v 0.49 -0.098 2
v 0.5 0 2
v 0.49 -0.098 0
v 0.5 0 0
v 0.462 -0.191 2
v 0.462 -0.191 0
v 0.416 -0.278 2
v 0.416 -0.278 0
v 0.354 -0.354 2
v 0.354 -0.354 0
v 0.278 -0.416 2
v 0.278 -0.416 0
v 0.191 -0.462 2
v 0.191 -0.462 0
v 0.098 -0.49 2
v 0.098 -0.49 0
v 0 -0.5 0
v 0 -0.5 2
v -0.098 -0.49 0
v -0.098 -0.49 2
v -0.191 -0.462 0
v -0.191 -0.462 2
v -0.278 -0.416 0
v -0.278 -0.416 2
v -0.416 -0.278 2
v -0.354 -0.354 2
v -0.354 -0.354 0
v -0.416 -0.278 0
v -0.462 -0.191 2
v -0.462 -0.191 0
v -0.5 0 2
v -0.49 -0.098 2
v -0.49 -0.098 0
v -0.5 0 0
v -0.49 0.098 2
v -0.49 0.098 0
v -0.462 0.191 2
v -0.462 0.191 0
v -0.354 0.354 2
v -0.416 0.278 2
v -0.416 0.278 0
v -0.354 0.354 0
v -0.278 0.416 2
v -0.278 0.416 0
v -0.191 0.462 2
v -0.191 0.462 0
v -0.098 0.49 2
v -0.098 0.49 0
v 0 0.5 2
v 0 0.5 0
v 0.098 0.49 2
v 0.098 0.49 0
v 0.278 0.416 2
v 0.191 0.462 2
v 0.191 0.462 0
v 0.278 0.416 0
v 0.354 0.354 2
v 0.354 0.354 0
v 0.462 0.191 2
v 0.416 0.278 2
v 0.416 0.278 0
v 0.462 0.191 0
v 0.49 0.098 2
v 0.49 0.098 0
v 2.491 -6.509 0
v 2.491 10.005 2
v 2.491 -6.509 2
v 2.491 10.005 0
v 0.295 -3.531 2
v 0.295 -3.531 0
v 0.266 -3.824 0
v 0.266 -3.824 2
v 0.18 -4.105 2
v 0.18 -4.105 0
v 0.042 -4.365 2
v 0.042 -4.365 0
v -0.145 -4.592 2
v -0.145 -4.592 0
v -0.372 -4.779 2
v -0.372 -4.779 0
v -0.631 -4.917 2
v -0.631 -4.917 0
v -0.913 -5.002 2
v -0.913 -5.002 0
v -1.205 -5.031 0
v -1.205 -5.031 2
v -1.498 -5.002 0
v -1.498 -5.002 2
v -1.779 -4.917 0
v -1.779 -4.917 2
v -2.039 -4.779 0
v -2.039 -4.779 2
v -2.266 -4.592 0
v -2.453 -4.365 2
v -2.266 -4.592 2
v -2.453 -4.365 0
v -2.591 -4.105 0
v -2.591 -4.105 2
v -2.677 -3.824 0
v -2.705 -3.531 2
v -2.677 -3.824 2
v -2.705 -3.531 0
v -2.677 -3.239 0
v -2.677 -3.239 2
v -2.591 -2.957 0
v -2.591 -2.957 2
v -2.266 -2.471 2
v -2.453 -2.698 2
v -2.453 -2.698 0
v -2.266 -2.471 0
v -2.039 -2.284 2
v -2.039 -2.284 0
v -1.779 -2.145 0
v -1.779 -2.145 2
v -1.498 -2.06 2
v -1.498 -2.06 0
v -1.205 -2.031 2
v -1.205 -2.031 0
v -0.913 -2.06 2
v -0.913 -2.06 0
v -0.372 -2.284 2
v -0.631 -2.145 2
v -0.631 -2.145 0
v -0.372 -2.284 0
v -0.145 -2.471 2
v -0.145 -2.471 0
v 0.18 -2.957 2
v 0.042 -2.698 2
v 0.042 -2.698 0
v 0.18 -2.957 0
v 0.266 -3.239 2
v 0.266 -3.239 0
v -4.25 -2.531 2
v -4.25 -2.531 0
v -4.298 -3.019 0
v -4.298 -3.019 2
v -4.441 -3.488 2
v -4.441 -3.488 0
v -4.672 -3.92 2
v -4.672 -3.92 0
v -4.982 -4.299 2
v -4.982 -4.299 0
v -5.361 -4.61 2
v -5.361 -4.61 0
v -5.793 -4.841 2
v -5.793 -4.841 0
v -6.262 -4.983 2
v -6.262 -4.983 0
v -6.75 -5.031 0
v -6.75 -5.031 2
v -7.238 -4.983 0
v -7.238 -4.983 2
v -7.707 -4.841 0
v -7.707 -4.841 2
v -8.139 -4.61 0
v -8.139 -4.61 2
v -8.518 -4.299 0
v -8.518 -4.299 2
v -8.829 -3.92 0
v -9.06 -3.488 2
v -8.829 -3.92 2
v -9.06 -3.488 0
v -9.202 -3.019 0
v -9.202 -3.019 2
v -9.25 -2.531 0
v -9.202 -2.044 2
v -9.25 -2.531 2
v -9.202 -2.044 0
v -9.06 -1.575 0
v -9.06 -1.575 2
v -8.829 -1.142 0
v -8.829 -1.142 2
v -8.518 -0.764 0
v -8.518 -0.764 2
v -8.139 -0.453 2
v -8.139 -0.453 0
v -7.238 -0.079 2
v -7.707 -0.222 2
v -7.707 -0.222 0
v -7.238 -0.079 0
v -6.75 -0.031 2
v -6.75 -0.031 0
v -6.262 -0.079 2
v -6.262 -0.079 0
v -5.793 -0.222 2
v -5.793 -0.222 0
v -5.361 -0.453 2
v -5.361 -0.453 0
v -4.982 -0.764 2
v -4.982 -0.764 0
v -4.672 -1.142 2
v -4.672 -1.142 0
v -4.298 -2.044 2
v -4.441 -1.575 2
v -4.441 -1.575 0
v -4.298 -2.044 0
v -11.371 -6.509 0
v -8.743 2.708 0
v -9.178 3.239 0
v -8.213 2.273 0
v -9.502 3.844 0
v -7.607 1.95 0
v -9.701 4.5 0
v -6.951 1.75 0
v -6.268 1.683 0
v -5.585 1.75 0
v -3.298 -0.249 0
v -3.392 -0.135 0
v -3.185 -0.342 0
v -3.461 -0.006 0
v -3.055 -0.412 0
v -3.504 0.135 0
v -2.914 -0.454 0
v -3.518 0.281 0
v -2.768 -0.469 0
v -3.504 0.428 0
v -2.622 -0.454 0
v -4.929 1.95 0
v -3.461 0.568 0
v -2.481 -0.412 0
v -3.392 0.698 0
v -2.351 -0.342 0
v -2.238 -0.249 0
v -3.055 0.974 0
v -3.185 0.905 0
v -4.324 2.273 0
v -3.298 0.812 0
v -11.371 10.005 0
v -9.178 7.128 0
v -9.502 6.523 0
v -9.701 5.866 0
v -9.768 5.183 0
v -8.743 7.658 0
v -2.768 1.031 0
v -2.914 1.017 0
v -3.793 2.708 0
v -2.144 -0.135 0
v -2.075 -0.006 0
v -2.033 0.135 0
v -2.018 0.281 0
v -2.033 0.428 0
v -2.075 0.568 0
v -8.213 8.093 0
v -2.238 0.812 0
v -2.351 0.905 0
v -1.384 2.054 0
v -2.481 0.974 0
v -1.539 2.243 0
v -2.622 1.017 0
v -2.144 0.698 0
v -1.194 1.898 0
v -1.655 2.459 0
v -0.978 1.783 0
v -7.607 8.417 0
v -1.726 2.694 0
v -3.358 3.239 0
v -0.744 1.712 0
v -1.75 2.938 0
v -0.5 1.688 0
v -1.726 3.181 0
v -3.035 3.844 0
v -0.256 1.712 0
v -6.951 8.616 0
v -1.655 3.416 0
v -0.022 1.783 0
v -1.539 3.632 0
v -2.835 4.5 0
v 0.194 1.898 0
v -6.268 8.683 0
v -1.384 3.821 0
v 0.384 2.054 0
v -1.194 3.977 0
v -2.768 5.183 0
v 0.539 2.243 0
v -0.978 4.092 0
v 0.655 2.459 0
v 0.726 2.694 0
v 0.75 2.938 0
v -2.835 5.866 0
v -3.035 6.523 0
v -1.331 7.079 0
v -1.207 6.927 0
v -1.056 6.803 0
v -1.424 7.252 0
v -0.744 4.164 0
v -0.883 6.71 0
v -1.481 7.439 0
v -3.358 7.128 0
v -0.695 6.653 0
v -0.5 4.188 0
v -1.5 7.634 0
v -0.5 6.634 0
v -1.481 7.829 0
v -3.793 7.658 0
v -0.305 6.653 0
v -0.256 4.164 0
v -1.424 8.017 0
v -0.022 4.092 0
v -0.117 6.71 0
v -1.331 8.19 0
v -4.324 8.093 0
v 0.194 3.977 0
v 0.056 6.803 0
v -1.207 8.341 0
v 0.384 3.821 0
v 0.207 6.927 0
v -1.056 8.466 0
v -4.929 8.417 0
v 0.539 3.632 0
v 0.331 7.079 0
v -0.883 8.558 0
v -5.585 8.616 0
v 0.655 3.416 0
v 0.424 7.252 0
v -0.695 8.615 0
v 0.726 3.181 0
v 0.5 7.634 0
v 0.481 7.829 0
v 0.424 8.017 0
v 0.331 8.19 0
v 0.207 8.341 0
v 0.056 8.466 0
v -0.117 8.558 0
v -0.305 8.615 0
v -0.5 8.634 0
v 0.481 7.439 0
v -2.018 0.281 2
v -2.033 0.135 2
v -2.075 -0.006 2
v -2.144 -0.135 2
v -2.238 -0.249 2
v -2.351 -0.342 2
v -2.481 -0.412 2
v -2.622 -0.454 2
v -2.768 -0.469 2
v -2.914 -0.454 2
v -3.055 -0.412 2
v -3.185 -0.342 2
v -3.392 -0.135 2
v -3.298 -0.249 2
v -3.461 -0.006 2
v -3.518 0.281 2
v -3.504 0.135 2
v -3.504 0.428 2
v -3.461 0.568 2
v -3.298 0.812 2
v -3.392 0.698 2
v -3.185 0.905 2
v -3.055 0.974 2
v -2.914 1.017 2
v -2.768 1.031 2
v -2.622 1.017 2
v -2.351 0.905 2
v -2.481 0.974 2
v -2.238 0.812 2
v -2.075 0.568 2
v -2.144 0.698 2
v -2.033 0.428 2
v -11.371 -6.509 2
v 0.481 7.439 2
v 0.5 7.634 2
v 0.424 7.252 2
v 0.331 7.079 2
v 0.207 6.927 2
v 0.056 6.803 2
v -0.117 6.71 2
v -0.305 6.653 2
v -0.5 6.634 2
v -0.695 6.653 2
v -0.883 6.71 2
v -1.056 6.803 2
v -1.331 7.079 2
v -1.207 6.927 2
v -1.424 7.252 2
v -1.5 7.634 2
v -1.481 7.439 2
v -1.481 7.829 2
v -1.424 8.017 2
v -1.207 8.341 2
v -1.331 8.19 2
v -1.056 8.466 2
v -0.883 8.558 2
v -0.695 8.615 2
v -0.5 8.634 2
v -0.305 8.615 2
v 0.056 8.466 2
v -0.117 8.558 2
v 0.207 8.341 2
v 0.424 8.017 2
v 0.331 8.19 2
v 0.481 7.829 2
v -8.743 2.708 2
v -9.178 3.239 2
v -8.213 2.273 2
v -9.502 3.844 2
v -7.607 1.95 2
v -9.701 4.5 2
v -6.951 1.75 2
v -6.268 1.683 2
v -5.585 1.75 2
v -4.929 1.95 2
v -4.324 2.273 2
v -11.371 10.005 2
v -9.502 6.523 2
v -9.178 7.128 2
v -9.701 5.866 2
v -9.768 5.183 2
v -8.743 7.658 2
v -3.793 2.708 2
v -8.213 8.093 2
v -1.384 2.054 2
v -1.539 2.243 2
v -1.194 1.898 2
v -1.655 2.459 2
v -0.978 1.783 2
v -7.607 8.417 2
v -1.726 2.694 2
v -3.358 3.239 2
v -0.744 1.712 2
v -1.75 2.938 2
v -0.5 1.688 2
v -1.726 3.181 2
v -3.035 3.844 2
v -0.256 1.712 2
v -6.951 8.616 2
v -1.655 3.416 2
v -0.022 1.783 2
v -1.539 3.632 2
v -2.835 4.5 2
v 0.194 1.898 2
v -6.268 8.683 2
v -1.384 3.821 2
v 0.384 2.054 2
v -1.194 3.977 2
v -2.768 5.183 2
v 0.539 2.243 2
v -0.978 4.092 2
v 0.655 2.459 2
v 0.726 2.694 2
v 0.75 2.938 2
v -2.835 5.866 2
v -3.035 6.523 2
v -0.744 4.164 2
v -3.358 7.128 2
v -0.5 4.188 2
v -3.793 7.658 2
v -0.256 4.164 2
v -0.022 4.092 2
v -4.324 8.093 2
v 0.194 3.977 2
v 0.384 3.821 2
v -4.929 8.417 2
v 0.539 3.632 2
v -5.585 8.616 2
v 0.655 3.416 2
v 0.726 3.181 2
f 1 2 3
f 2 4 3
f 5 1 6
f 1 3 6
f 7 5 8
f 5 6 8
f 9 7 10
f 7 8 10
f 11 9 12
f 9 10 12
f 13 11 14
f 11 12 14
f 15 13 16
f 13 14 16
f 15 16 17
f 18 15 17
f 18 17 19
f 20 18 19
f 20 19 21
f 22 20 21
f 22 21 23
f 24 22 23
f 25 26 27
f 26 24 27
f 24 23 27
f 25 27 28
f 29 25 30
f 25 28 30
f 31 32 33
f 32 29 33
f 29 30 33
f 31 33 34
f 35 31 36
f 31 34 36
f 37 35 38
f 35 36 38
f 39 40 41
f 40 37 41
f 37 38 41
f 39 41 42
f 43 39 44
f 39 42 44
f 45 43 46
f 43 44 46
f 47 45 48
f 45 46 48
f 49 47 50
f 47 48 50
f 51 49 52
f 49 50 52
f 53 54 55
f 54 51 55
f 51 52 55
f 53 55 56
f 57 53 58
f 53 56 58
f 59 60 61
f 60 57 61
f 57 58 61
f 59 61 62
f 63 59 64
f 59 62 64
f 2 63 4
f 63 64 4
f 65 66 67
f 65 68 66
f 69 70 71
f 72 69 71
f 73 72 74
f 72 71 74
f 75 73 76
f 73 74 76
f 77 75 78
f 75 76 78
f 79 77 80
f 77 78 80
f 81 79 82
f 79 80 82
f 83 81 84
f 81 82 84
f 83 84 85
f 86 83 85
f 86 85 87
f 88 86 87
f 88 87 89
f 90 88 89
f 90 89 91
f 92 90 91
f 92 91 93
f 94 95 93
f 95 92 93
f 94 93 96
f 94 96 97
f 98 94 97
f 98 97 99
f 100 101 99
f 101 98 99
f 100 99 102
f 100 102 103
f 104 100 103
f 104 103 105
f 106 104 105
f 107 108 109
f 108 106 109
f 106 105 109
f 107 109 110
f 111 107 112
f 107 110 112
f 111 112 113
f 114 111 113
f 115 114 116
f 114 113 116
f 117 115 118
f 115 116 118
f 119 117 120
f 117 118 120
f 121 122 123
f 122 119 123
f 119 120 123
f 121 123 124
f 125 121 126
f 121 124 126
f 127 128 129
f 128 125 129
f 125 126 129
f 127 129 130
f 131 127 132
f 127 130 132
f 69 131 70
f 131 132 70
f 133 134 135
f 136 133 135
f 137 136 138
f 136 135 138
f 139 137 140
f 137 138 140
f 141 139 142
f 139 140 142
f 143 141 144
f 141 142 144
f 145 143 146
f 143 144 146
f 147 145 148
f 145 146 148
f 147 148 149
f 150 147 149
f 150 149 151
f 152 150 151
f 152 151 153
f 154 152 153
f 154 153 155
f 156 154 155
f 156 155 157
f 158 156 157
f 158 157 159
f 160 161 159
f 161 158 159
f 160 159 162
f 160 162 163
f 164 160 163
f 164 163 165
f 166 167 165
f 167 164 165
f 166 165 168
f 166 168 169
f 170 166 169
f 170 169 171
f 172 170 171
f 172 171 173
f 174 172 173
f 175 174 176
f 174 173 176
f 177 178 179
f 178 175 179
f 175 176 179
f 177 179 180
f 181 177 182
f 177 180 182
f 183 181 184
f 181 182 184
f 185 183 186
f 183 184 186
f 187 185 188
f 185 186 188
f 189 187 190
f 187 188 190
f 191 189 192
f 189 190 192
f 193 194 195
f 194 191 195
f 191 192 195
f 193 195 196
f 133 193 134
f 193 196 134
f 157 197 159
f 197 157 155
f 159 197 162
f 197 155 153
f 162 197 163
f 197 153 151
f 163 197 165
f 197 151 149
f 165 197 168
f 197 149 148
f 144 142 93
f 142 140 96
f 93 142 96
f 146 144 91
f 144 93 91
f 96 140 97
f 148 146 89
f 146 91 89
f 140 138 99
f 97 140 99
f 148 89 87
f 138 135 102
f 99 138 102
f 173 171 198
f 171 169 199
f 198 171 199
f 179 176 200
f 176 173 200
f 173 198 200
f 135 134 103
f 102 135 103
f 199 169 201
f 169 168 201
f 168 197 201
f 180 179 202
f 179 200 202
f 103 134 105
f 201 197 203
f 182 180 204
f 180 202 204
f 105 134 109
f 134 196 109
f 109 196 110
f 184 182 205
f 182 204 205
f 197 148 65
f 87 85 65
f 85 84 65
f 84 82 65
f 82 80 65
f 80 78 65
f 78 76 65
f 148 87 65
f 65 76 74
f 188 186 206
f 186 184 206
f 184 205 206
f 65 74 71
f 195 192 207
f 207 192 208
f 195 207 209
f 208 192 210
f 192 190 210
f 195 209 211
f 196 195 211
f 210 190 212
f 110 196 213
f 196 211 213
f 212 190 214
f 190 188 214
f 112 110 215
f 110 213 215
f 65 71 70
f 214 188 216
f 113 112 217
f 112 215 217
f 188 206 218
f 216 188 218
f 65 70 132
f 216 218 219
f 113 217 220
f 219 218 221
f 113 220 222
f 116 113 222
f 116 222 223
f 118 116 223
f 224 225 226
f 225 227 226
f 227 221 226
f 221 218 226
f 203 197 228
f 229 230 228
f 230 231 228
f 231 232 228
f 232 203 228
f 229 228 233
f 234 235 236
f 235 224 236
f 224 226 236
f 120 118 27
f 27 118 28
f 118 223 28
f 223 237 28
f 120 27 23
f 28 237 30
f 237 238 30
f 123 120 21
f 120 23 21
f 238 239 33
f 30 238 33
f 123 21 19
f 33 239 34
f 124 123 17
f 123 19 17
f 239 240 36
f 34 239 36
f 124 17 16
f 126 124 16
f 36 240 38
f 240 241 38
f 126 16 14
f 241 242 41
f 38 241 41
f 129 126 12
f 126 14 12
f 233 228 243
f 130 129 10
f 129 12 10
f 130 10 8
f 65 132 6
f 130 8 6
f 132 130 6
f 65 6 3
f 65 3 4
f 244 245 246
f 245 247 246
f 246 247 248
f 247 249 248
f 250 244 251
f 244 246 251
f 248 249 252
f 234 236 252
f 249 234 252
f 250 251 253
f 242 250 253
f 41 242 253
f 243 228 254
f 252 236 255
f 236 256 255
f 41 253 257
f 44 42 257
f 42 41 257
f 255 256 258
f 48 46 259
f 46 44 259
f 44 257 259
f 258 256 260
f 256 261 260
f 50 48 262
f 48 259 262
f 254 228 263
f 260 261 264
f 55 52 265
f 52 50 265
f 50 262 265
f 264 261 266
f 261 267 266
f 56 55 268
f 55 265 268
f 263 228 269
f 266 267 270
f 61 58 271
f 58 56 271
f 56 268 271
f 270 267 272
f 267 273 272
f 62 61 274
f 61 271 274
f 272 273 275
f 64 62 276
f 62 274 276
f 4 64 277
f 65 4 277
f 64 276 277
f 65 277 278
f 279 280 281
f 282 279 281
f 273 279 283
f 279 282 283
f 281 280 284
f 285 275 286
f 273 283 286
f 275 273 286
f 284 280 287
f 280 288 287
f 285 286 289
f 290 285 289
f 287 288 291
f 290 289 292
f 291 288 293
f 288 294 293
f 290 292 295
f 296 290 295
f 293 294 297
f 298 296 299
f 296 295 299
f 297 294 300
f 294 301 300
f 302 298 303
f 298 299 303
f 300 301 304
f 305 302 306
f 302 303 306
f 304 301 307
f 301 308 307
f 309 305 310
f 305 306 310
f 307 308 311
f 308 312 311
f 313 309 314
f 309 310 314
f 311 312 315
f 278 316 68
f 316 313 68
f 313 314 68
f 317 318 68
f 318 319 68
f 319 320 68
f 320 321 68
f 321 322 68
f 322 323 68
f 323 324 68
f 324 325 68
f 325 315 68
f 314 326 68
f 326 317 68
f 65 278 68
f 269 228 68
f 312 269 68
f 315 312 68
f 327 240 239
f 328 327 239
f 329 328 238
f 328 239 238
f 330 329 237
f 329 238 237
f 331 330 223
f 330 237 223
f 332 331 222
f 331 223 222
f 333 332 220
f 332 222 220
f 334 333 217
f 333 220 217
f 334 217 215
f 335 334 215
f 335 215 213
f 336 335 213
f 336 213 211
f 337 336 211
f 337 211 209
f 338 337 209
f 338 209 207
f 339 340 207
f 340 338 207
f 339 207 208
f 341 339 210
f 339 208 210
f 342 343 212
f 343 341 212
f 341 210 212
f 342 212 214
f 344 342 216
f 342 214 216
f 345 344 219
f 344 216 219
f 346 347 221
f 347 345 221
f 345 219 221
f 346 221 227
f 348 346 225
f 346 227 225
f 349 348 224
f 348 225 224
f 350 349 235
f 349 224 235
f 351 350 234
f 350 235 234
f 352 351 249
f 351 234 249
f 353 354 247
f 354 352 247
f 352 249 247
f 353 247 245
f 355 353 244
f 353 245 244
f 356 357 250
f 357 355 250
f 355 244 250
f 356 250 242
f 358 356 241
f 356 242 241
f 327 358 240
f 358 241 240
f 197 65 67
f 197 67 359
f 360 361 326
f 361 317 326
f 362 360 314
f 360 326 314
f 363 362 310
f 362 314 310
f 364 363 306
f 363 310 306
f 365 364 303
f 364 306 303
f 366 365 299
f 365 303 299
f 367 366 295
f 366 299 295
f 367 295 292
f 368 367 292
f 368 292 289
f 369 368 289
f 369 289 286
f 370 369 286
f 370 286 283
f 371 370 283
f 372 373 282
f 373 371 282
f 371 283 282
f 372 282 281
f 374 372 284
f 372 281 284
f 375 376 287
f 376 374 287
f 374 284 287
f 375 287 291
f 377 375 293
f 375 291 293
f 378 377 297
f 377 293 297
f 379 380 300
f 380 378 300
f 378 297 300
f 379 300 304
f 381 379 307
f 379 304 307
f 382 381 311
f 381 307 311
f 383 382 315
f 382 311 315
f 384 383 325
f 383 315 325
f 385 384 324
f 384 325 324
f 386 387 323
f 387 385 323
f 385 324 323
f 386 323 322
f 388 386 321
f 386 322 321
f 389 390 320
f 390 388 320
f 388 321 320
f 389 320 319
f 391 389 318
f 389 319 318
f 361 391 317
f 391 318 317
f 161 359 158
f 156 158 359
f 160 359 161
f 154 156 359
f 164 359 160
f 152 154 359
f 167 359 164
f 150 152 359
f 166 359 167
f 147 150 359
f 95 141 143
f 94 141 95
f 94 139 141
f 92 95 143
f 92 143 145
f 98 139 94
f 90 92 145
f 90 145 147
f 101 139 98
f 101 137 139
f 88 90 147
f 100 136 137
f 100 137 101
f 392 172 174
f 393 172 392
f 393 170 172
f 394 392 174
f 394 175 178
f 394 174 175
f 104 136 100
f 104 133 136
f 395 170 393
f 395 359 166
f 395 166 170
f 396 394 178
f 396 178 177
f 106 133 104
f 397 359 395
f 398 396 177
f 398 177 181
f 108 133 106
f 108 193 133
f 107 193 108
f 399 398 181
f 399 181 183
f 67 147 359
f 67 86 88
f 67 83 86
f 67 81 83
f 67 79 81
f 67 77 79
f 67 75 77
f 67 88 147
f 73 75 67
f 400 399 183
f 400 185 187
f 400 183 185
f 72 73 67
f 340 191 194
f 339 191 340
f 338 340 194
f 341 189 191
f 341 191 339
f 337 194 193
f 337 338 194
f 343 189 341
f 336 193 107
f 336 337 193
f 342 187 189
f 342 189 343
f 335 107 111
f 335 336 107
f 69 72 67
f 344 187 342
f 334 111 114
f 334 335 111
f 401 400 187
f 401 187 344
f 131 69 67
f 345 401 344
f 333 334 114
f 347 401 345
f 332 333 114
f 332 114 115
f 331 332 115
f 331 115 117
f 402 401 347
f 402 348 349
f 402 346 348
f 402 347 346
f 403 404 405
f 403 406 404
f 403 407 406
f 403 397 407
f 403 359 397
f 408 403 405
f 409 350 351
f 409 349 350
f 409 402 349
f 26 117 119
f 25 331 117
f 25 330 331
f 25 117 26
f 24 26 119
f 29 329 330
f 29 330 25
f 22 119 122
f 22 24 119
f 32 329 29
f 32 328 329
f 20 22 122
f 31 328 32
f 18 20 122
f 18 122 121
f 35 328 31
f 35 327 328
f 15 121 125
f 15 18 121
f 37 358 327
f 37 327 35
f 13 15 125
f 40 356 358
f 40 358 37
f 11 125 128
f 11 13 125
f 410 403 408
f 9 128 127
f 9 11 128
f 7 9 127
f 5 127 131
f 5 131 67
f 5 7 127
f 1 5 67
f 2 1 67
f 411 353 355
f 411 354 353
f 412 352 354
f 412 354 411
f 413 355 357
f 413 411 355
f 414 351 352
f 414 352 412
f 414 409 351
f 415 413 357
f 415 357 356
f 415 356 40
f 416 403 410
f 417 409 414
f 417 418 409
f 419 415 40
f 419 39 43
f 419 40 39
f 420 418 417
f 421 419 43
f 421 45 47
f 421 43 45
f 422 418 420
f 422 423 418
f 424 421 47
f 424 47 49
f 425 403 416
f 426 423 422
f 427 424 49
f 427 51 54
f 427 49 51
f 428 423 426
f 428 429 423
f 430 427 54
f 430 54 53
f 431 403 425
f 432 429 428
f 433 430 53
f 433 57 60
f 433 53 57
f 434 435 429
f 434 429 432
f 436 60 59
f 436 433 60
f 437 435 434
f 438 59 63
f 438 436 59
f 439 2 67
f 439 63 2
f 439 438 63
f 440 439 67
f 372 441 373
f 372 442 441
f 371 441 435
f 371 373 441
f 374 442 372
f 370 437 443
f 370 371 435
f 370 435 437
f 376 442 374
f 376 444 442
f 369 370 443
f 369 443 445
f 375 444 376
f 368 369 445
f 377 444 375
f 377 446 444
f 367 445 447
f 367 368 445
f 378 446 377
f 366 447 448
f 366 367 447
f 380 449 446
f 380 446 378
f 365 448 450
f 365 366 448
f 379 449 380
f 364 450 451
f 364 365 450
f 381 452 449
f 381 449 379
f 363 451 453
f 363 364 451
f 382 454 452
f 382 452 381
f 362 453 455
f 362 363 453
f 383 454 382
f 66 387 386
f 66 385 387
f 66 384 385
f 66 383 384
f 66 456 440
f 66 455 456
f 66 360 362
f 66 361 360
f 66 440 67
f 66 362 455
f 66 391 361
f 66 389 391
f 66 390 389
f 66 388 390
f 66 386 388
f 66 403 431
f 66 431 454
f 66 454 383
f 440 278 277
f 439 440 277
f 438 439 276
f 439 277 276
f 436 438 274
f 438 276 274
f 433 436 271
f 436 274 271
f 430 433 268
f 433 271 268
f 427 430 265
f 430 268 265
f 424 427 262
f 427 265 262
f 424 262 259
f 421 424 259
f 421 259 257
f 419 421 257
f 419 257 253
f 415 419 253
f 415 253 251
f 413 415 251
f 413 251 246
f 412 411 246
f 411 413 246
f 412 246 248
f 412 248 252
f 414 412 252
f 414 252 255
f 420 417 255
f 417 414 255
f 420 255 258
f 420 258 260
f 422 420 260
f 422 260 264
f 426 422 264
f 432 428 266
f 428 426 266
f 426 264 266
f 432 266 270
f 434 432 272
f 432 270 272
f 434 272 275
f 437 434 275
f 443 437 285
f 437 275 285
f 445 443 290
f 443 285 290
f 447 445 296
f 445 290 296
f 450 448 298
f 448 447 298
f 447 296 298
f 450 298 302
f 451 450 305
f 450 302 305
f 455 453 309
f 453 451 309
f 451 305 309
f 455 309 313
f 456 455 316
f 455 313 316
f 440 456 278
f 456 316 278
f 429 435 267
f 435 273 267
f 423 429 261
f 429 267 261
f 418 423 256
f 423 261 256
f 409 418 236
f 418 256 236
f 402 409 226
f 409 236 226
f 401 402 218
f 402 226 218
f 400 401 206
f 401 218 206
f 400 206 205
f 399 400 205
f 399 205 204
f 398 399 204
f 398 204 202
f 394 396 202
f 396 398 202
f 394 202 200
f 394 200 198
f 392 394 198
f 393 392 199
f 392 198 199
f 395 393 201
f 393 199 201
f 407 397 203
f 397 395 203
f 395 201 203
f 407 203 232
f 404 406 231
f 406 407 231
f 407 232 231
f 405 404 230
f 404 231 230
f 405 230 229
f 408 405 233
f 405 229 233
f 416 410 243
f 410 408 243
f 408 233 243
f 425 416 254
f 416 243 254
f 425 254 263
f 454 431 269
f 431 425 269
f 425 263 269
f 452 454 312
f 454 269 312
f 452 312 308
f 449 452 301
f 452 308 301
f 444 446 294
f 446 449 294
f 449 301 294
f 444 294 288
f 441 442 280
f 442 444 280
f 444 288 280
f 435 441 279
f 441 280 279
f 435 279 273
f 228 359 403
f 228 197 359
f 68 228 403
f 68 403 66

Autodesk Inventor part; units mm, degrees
ref_plane "YZ Plane" through (0, 0, 0) normal (1, 0, 0) x (0, 1, 0)
ref_plane "XZ Plane" through (0, 0, 0) normal (0, 1, 0) x (-1, 0, 0)
ref_plane "XY Plane" through (0, 0, 0) normal (0, 0, 1) x (1, 0, 0)
sketch "Sketch1" plane through (0, 0, 0) normal (0, 0, 1) x (1, 0, 0)
  circle A0 centre (0, 0) radius 0.5
  circle A1 centre (-2.7681, 0.2813) radius 0.75
  circle A2 centre (-0.5, 7.6342) radius 1
  circle A3 centre (-0.5, 2.9376) radius 1.25
  circle A4 centre (-1.2054, -3.5313) radius 1.5
  circle A5 centre (-6.7502, -2.5313) radius 2.5
  circle A6 centre (-6.2681, 5.1832) radius 3.5
  line L0 (2.4912, -6.5091) -> (-11.3709, -6.5091)
  line L1 (-11.3709, -6.5091) -> (-11.3709, 10.0048)
  line L2 (-11.3709, 10.0048) -> (2.4912, 10.0048)
  line L3 (2.4912, 10.0048) -> (2.4912, -6.5091)
  dimension "d0" = 1
  dimension "d1" = 1.5
  dimension "d2" = 2
  dimension "d3" = 2.5
  dimension "d4" = 3
  dimension "d5" = 5
  dimension "d6" = 7
extrude "Extrusion1" add sketch "Sketch1" along normal blind 2
properties part number "hole_test"
